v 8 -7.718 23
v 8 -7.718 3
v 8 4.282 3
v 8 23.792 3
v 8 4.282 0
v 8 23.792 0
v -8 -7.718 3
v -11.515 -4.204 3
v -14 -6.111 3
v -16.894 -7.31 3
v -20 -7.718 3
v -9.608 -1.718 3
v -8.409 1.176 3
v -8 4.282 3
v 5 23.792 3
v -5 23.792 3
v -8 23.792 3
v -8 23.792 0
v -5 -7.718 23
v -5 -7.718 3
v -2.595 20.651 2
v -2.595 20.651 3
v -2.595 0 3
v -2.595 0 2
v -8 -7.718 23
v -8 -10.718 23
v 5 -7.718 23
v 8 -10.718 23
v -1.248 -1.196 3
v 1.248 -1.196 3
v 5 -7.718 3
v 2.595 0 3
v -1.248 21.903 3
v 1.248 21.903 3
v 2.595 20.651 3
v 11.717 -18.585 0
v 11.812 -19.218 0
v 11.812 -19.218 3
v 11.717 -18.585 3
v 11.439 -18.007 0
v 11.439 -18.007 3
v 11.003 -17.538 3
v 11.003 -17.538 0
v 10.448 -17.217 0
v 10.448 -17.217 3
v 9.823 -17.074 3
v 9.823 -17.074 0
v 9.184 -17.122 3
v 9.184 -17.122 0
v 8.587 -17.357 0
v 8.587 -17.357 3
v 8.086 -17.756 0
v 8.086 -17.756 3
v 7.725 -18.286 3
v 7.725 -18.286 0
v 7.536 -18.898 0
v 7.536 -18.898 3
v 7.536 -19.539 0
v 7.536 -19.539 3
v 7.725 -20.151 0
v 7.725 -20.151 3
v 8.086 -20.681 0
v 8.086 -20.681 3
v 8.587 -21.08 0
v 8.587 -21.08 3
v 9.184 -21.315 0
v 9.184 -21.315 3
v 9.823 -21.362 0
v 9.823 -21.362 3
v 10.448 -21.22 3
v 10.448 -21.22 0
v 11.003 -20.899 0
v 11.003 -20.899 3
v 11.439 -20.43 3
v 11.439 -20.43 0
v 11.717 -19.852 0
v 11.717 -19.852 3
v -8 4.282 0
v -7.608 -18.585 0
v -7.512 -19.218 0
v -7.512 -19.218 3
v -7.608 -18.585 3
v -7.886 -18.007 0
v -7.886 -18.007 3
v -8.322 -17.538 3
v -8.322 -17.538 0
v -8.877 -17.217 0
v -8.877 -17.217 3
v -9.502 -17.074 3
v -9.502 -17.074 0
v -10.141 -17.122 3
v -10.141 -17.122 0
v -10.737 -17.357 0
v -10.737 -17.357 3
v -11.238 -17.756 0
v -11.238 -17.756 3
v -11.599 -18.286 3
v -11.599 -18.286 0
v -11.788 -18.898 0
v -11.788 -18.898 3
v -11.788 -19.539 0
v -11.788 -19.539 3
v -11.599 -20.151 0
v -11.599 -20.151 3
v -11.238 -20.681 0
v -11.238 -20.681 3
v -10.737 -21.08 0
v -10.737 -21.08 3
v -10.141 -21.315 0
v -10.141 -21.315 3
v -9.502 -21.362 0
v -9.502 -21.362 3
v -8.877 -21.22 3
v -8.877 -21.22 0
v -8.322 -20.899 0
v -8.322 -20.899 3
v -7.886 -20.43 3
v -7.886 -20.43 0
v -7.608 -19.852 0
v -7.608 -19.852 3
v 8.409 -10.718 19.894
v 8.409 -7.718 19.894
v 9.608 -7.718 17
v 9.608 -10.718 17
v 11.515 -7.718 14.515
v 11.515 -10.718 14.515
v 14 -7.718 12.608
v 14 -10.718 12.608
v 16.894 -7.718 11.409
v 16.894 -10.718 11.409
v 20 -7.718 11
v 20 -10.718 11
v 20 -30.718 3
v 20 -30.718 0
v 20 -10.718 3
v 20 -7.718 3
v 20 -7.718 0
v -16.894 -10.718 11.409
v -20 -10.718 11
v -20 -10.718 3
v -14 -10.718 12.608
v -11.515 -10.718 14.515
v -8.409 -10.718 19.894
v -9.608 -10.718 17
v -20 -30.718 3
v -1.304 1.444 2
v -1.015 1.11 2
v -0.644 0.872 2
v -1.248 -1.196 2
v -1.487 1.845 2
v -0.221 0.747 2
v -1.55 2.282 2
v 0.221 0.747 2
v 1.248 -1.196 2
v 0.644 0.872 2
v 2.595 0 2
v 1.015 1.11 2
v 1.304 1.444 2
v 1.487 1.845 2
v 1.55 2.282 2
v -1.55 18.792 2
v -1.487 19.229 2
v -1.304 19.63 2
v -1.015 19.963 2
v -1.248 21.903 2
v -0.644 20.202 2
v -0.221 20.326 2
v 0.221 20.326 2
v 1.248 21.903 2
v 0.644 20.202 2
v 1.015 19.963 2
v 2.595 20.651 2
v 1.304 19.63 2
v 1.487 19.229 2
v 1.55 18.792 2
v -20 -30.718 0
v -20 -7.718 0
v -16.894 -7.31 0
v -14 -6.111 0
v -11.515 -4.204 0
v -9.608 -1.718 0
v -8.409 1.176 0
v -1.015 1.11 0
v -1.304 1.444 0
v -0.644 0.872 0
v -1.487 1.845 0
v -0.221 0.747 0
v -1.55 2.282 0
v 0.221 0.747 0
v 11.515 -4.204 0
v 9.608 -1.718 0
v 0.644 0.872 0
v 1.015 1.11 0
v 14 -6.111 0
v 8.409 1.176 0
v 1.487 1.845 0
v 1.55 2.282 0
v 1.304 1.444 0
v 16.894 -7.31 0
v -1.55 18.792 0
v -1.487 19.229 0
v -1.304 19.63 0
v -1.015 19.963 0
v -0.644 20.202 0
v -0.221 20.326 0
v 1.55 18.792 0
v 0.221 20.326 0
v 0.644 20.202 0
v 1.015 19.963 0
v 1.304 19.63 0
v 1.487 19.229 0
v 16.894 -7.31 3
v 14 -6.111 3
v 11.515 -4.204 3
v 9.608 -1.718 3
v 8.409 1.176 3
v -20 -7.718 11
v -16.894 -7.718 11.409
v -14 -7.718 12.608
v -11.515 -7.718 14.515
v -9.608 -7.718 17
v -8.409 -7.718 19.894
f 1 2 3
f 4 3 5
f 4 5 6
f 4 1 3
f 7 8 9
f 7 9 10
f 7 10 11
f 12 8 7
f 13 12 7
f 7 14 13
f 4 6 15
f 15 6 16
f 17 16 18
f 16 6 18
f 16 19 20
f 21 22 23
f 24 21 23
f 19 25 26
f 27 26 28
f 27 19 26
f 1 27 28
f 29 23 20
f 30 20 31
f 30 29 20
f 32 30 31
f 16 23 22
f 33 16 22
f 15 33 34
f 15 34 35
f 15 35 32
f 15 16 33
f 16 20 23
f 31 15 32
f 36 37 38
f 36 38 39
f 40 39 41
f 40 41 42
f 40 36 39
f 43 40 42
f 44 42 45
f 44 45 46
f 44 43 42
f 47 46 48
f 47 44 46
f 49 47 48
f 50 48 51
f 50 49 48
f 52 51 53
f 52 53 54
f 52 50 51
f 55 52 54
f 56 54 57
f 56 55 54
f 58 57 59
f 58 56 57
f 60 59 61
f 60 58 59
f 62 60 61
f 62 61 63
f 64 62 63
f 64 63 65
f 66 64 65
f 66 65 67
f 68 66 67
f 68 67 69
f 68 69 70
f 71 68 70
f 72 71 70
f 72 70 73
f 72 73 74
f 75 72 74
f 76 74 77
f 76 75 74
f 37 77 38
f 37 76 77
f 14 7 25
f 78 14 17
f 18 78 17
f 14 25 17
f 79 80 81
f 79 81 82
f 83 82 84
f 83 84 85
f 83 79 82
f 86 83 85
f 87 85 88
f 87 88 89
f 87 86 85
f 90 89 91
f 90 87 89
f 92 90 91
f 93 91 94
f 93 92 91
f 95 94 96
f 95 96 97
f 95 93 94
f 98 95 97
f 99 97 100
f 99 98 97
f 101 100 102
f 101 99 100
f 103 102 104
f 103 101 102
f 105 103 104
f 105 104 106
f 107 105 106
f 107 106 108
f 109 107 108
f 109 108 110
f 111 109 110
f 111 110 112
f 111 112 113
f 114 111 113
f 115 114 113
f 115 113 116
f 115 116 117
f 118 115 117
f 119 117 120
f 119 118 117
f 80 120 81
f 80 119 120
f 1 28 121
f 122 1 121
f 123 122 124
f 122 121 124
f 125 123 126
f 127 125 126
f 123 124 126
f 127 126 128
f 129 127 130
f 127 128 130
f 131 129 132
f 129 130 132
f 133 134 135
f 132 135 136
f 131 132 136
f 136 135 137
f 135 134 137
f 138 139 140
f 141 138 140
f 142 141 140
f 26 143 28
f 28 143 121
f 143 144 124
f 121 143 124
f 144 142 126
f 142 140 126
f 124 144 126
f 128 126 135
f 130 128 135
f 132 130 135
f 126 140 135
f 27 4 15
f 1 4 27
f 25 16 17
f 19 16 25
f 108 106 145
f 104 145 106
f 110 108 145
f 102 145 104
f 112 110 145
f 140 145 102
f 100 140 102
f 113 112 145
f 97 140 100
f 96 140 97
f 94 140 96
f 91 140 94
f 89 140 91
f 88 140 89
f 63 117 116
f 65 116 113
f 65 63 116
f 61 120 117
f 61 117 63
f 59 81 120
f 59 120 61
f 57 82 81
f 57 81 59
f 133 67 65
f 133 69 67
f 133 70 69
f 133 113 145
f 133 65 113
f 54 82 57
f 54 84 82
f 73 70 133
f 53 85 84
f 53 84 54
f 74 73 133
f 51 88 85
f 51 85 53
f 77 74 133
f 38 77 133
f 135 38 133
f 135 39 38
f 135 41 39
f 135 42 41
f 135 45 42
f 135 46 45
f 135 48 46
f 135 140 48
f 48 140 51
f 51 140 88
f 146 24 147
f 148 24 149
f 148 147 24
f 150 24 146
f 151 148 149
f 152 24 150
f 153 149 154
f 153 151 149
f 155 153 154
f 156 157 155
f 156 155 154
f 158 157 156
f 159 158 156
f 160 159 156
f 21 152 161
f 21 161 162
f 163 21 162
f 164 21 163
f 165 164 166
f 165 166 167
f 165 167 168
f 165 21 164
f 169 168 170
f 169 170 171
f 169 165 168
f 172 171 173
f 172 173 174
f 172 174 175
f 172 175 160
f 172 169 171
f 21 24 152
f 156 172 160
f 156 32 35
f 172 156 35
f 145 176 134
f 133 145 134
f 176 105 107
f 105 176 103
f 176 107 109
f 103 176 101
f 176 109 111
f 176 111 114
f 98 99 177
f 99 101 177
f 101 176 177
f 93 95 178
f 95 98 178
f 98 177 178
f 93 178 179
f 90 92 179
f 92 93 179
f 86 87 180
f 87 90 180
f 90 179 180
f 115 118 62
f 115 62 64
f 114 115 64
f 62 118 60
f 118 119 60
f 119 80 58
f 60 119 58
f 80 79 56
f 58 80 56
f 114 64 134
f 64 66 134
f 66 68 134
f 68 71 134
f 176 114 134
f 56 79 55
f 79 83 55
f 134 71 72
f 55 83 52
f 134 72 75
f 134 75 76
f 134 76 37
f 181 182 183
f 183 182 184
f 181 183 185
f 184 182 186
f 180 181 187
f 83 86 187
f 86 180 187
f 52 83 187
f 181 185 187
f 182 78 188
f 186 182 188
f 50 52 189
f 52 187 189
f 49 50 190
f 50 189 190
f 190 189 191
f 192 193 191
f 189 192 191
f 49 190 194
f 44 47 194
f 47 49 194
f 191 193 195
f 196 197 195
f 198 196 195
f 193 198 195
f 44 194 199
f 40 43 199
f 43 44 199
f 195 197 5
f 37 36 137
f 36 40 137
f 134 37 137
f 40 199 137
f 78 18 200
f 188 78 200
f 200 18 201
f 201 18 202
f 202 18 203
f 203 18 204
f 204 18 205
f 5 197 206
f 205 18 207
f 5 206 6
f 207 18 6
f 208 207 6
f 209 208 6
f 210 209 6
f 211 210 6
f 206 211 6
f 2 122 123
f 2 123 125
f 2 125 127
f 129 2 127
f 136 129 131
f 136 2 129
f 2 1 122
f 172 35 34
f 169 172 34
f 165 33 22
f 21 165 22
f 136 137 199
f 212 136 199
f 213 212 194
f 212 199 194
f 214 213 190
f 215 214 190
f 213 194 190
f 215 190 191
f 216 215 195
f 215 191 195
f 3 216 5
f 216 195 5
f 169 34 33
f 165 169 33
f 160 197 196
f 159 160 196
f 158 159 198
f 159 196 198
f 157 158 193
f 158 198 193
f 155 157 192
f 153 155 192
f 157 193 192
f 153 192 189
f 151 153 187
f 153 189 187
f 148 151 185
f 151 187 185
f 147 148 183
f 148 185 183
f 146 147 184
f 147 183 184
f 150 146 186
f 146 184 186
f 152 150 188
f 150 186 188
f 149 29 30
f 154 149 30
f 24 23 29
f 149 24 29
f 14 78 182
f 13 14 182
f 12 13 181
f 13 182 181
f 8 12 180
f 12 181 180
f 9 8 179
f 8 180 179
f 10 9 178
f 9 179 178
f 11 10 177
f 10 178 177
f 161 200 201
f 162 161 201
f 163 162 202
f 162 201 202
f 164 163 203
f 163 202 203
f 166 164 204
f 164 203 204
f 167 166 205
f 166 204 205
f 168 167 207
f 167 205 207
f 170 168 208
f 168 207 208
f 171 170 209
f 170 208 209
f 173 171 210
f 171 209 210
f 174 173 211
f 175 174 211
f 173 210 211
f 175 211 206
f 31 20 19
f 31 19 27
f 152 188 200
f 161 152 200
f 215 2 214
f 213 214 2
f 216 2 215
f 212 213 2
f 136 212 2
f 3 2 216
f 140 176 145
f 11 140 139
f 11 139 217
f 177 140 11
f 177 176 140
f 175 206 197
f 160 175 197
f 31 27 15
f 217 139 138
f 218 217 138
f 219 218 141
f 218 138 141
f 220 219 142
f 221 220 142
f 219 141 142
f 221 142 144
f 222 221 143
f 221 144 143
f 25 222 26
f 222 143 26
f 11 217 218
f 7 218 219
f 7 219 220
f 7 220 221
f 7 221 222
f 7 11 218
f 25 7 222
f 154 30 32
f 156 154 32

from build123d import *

# Parameters (mm, degrees)
F0_R      = 2.15
F1_DEPTH  = 3
F2_W      = 40
F2_H      = 3
F3_DEPTH  = 20
F5_DEPTH  = 4
F7_START  = -12
F7_DEPTH  = 3
F8_START  = -25
F8_DEPTH  = 3
F10_DEPTH = 1


with BuildPart() as f1:
    # F0 (on Top) → F1 (new body)
    with BuildSketch(Plane.XY):
        Polygon((-8, 4.2815308196), (-8, -7.7184691804), (8, -7.7184691804), (8, 4.2815308196), (8, 23.7919500181), (-8, 23.7919500181), align=None)
        with BuildLine():
            ThreePointArc((-1.55, 18.7919500181), (0, 20.3419500181), (1.55, 18.7919500181))
            Line((1.55, 18.7919500181), (1.55, 2.2815308196))
            ThreePointArc((1.55, 2.2815308196), (0, 0.7315308196), (-1.55, 2.2815308196))
            Line((-1.55, 2.2815308196), (-1.55, 18.7919500181))
        make_face(mode=Mode.SUBTRACT)
        with BuildLine():
            ThreePointArc((-8, 4.2815308196), (-11.5147186258, -4.2037505546), (-20, -7.7184691804))
            Line((-20, -7.7184691804), (-8, -7.7184691804))
            Line((-8, -7.7184691804), (-8, 4.2815308196))
        make_face()
        with BuildLine():
            Line((8, 4.2815308196), (8, -7.7184691804))
            Line((8, -7.7184691804), (20, -7.7184691804))
            ThreePointArc((20, -7.7184691804), (11.5147186258, -4.2037505546), (8, 4.2815308196))
        make_face()
        Polygon((-8, -7.7184691804), (-20, -7.7184691804), (-20, -30.7184691804), (20, -30.7184691804), (20, -7.7184691804), (8, -7.7184691804), align=None)
        with Locations((-9.6621733536, -19.2184691804)):
            Circle(F0_R, mode=Mode.SUBTRACT)
        with Locations((9.6621733536, -19.2184691804)):
            Circle(F0_R, mode=Mode.SUBTRACT)
    extrude(amount=F1_DEPTH)

    # F2 (on face) → F3 (join)
    with BuildSketch(Plane.XY.offset(3)):
        with Locations((0, -9.2184691804)):
            Rectangle(F2_W, F2_H)
    extrude(amount=F3_DEPTH)

    # F4 (on face) → F5 (cut)
    with BuildSketch(Plane.XZ.offset(10.7184691804)):
        with BuildLine():
            Line((-20, 23), (-20, 11))
            ThreePointArc((-20, 11), (-11.5147186258, 14.5147186258), (-8, 23))
            Line((-8, 23), (-20, 23))
        make_face()
        with BuildLine():
            Line((20, 23), (8, 23))
            ThreePointArc((8, 23), (11.5147186258, 14.5147186258), (20, 11))
            Line((20, 11), (20, 23))
        make_face()
    extrude(amount=-F5_DEPTH, mode=Mode.SUBTRACT)

    # F6 (on face) → F7 (join)
    with BuildSketch(Plane.YZ.offset(20).offset(F7_START)):
        Polygon((23.7919500181, 3), (-7.7184691804, 23), (-7.7184691804, 11), (-7.7184691804, 3), align=None)
    extrude(amount=-F7_DEPTH)

    # F6 (on face) → F8 (join)
    with BuildSketch(Plane.YZ.offset(20).offset(F8_START)):
        Polygon((23.7919500181, 3), (-7.7184691804, 23), (-7.7184691804, 3), align=None)
    extrude(amount=-F8_DEPTH)

    # F9 (on face) → F10 (cut)
    with BuildSketch(Plane.XY.offset(3)):
        Polygon((1.2478875427, 21.9026152913), (-1.2478875427, 21.9026152913), (-2.5953908917, 20.6514410675), (-2.5953908917, 0), (-1.2478875427, -1.1958031218), (1.2478875427, -1.1958031218), (2.5953908917, 0), (2.5953908917, 20.6514410675), align=None)
        with BuildLine():
            Line((-1.55, 2.2815308196), (-1.55, 18.7919500181))
            ThreePointArc((-1.55, 18.7919500181), (0, 20.3419500181), (1.55, 18.7919500181))
            Line((1.55, 18.7919500181), (1.55, 2.2815308196))
            ThreePointArc((1.55, 2.2815308196), (0, 0.7315308196), (-1.55, 2.2815308196))
        make_face(mode=Mode.SUBTRACT)
    extrude(amount=-F10_DEPTH, mode=Mode.SUBTRACT)


solid = f1.part
